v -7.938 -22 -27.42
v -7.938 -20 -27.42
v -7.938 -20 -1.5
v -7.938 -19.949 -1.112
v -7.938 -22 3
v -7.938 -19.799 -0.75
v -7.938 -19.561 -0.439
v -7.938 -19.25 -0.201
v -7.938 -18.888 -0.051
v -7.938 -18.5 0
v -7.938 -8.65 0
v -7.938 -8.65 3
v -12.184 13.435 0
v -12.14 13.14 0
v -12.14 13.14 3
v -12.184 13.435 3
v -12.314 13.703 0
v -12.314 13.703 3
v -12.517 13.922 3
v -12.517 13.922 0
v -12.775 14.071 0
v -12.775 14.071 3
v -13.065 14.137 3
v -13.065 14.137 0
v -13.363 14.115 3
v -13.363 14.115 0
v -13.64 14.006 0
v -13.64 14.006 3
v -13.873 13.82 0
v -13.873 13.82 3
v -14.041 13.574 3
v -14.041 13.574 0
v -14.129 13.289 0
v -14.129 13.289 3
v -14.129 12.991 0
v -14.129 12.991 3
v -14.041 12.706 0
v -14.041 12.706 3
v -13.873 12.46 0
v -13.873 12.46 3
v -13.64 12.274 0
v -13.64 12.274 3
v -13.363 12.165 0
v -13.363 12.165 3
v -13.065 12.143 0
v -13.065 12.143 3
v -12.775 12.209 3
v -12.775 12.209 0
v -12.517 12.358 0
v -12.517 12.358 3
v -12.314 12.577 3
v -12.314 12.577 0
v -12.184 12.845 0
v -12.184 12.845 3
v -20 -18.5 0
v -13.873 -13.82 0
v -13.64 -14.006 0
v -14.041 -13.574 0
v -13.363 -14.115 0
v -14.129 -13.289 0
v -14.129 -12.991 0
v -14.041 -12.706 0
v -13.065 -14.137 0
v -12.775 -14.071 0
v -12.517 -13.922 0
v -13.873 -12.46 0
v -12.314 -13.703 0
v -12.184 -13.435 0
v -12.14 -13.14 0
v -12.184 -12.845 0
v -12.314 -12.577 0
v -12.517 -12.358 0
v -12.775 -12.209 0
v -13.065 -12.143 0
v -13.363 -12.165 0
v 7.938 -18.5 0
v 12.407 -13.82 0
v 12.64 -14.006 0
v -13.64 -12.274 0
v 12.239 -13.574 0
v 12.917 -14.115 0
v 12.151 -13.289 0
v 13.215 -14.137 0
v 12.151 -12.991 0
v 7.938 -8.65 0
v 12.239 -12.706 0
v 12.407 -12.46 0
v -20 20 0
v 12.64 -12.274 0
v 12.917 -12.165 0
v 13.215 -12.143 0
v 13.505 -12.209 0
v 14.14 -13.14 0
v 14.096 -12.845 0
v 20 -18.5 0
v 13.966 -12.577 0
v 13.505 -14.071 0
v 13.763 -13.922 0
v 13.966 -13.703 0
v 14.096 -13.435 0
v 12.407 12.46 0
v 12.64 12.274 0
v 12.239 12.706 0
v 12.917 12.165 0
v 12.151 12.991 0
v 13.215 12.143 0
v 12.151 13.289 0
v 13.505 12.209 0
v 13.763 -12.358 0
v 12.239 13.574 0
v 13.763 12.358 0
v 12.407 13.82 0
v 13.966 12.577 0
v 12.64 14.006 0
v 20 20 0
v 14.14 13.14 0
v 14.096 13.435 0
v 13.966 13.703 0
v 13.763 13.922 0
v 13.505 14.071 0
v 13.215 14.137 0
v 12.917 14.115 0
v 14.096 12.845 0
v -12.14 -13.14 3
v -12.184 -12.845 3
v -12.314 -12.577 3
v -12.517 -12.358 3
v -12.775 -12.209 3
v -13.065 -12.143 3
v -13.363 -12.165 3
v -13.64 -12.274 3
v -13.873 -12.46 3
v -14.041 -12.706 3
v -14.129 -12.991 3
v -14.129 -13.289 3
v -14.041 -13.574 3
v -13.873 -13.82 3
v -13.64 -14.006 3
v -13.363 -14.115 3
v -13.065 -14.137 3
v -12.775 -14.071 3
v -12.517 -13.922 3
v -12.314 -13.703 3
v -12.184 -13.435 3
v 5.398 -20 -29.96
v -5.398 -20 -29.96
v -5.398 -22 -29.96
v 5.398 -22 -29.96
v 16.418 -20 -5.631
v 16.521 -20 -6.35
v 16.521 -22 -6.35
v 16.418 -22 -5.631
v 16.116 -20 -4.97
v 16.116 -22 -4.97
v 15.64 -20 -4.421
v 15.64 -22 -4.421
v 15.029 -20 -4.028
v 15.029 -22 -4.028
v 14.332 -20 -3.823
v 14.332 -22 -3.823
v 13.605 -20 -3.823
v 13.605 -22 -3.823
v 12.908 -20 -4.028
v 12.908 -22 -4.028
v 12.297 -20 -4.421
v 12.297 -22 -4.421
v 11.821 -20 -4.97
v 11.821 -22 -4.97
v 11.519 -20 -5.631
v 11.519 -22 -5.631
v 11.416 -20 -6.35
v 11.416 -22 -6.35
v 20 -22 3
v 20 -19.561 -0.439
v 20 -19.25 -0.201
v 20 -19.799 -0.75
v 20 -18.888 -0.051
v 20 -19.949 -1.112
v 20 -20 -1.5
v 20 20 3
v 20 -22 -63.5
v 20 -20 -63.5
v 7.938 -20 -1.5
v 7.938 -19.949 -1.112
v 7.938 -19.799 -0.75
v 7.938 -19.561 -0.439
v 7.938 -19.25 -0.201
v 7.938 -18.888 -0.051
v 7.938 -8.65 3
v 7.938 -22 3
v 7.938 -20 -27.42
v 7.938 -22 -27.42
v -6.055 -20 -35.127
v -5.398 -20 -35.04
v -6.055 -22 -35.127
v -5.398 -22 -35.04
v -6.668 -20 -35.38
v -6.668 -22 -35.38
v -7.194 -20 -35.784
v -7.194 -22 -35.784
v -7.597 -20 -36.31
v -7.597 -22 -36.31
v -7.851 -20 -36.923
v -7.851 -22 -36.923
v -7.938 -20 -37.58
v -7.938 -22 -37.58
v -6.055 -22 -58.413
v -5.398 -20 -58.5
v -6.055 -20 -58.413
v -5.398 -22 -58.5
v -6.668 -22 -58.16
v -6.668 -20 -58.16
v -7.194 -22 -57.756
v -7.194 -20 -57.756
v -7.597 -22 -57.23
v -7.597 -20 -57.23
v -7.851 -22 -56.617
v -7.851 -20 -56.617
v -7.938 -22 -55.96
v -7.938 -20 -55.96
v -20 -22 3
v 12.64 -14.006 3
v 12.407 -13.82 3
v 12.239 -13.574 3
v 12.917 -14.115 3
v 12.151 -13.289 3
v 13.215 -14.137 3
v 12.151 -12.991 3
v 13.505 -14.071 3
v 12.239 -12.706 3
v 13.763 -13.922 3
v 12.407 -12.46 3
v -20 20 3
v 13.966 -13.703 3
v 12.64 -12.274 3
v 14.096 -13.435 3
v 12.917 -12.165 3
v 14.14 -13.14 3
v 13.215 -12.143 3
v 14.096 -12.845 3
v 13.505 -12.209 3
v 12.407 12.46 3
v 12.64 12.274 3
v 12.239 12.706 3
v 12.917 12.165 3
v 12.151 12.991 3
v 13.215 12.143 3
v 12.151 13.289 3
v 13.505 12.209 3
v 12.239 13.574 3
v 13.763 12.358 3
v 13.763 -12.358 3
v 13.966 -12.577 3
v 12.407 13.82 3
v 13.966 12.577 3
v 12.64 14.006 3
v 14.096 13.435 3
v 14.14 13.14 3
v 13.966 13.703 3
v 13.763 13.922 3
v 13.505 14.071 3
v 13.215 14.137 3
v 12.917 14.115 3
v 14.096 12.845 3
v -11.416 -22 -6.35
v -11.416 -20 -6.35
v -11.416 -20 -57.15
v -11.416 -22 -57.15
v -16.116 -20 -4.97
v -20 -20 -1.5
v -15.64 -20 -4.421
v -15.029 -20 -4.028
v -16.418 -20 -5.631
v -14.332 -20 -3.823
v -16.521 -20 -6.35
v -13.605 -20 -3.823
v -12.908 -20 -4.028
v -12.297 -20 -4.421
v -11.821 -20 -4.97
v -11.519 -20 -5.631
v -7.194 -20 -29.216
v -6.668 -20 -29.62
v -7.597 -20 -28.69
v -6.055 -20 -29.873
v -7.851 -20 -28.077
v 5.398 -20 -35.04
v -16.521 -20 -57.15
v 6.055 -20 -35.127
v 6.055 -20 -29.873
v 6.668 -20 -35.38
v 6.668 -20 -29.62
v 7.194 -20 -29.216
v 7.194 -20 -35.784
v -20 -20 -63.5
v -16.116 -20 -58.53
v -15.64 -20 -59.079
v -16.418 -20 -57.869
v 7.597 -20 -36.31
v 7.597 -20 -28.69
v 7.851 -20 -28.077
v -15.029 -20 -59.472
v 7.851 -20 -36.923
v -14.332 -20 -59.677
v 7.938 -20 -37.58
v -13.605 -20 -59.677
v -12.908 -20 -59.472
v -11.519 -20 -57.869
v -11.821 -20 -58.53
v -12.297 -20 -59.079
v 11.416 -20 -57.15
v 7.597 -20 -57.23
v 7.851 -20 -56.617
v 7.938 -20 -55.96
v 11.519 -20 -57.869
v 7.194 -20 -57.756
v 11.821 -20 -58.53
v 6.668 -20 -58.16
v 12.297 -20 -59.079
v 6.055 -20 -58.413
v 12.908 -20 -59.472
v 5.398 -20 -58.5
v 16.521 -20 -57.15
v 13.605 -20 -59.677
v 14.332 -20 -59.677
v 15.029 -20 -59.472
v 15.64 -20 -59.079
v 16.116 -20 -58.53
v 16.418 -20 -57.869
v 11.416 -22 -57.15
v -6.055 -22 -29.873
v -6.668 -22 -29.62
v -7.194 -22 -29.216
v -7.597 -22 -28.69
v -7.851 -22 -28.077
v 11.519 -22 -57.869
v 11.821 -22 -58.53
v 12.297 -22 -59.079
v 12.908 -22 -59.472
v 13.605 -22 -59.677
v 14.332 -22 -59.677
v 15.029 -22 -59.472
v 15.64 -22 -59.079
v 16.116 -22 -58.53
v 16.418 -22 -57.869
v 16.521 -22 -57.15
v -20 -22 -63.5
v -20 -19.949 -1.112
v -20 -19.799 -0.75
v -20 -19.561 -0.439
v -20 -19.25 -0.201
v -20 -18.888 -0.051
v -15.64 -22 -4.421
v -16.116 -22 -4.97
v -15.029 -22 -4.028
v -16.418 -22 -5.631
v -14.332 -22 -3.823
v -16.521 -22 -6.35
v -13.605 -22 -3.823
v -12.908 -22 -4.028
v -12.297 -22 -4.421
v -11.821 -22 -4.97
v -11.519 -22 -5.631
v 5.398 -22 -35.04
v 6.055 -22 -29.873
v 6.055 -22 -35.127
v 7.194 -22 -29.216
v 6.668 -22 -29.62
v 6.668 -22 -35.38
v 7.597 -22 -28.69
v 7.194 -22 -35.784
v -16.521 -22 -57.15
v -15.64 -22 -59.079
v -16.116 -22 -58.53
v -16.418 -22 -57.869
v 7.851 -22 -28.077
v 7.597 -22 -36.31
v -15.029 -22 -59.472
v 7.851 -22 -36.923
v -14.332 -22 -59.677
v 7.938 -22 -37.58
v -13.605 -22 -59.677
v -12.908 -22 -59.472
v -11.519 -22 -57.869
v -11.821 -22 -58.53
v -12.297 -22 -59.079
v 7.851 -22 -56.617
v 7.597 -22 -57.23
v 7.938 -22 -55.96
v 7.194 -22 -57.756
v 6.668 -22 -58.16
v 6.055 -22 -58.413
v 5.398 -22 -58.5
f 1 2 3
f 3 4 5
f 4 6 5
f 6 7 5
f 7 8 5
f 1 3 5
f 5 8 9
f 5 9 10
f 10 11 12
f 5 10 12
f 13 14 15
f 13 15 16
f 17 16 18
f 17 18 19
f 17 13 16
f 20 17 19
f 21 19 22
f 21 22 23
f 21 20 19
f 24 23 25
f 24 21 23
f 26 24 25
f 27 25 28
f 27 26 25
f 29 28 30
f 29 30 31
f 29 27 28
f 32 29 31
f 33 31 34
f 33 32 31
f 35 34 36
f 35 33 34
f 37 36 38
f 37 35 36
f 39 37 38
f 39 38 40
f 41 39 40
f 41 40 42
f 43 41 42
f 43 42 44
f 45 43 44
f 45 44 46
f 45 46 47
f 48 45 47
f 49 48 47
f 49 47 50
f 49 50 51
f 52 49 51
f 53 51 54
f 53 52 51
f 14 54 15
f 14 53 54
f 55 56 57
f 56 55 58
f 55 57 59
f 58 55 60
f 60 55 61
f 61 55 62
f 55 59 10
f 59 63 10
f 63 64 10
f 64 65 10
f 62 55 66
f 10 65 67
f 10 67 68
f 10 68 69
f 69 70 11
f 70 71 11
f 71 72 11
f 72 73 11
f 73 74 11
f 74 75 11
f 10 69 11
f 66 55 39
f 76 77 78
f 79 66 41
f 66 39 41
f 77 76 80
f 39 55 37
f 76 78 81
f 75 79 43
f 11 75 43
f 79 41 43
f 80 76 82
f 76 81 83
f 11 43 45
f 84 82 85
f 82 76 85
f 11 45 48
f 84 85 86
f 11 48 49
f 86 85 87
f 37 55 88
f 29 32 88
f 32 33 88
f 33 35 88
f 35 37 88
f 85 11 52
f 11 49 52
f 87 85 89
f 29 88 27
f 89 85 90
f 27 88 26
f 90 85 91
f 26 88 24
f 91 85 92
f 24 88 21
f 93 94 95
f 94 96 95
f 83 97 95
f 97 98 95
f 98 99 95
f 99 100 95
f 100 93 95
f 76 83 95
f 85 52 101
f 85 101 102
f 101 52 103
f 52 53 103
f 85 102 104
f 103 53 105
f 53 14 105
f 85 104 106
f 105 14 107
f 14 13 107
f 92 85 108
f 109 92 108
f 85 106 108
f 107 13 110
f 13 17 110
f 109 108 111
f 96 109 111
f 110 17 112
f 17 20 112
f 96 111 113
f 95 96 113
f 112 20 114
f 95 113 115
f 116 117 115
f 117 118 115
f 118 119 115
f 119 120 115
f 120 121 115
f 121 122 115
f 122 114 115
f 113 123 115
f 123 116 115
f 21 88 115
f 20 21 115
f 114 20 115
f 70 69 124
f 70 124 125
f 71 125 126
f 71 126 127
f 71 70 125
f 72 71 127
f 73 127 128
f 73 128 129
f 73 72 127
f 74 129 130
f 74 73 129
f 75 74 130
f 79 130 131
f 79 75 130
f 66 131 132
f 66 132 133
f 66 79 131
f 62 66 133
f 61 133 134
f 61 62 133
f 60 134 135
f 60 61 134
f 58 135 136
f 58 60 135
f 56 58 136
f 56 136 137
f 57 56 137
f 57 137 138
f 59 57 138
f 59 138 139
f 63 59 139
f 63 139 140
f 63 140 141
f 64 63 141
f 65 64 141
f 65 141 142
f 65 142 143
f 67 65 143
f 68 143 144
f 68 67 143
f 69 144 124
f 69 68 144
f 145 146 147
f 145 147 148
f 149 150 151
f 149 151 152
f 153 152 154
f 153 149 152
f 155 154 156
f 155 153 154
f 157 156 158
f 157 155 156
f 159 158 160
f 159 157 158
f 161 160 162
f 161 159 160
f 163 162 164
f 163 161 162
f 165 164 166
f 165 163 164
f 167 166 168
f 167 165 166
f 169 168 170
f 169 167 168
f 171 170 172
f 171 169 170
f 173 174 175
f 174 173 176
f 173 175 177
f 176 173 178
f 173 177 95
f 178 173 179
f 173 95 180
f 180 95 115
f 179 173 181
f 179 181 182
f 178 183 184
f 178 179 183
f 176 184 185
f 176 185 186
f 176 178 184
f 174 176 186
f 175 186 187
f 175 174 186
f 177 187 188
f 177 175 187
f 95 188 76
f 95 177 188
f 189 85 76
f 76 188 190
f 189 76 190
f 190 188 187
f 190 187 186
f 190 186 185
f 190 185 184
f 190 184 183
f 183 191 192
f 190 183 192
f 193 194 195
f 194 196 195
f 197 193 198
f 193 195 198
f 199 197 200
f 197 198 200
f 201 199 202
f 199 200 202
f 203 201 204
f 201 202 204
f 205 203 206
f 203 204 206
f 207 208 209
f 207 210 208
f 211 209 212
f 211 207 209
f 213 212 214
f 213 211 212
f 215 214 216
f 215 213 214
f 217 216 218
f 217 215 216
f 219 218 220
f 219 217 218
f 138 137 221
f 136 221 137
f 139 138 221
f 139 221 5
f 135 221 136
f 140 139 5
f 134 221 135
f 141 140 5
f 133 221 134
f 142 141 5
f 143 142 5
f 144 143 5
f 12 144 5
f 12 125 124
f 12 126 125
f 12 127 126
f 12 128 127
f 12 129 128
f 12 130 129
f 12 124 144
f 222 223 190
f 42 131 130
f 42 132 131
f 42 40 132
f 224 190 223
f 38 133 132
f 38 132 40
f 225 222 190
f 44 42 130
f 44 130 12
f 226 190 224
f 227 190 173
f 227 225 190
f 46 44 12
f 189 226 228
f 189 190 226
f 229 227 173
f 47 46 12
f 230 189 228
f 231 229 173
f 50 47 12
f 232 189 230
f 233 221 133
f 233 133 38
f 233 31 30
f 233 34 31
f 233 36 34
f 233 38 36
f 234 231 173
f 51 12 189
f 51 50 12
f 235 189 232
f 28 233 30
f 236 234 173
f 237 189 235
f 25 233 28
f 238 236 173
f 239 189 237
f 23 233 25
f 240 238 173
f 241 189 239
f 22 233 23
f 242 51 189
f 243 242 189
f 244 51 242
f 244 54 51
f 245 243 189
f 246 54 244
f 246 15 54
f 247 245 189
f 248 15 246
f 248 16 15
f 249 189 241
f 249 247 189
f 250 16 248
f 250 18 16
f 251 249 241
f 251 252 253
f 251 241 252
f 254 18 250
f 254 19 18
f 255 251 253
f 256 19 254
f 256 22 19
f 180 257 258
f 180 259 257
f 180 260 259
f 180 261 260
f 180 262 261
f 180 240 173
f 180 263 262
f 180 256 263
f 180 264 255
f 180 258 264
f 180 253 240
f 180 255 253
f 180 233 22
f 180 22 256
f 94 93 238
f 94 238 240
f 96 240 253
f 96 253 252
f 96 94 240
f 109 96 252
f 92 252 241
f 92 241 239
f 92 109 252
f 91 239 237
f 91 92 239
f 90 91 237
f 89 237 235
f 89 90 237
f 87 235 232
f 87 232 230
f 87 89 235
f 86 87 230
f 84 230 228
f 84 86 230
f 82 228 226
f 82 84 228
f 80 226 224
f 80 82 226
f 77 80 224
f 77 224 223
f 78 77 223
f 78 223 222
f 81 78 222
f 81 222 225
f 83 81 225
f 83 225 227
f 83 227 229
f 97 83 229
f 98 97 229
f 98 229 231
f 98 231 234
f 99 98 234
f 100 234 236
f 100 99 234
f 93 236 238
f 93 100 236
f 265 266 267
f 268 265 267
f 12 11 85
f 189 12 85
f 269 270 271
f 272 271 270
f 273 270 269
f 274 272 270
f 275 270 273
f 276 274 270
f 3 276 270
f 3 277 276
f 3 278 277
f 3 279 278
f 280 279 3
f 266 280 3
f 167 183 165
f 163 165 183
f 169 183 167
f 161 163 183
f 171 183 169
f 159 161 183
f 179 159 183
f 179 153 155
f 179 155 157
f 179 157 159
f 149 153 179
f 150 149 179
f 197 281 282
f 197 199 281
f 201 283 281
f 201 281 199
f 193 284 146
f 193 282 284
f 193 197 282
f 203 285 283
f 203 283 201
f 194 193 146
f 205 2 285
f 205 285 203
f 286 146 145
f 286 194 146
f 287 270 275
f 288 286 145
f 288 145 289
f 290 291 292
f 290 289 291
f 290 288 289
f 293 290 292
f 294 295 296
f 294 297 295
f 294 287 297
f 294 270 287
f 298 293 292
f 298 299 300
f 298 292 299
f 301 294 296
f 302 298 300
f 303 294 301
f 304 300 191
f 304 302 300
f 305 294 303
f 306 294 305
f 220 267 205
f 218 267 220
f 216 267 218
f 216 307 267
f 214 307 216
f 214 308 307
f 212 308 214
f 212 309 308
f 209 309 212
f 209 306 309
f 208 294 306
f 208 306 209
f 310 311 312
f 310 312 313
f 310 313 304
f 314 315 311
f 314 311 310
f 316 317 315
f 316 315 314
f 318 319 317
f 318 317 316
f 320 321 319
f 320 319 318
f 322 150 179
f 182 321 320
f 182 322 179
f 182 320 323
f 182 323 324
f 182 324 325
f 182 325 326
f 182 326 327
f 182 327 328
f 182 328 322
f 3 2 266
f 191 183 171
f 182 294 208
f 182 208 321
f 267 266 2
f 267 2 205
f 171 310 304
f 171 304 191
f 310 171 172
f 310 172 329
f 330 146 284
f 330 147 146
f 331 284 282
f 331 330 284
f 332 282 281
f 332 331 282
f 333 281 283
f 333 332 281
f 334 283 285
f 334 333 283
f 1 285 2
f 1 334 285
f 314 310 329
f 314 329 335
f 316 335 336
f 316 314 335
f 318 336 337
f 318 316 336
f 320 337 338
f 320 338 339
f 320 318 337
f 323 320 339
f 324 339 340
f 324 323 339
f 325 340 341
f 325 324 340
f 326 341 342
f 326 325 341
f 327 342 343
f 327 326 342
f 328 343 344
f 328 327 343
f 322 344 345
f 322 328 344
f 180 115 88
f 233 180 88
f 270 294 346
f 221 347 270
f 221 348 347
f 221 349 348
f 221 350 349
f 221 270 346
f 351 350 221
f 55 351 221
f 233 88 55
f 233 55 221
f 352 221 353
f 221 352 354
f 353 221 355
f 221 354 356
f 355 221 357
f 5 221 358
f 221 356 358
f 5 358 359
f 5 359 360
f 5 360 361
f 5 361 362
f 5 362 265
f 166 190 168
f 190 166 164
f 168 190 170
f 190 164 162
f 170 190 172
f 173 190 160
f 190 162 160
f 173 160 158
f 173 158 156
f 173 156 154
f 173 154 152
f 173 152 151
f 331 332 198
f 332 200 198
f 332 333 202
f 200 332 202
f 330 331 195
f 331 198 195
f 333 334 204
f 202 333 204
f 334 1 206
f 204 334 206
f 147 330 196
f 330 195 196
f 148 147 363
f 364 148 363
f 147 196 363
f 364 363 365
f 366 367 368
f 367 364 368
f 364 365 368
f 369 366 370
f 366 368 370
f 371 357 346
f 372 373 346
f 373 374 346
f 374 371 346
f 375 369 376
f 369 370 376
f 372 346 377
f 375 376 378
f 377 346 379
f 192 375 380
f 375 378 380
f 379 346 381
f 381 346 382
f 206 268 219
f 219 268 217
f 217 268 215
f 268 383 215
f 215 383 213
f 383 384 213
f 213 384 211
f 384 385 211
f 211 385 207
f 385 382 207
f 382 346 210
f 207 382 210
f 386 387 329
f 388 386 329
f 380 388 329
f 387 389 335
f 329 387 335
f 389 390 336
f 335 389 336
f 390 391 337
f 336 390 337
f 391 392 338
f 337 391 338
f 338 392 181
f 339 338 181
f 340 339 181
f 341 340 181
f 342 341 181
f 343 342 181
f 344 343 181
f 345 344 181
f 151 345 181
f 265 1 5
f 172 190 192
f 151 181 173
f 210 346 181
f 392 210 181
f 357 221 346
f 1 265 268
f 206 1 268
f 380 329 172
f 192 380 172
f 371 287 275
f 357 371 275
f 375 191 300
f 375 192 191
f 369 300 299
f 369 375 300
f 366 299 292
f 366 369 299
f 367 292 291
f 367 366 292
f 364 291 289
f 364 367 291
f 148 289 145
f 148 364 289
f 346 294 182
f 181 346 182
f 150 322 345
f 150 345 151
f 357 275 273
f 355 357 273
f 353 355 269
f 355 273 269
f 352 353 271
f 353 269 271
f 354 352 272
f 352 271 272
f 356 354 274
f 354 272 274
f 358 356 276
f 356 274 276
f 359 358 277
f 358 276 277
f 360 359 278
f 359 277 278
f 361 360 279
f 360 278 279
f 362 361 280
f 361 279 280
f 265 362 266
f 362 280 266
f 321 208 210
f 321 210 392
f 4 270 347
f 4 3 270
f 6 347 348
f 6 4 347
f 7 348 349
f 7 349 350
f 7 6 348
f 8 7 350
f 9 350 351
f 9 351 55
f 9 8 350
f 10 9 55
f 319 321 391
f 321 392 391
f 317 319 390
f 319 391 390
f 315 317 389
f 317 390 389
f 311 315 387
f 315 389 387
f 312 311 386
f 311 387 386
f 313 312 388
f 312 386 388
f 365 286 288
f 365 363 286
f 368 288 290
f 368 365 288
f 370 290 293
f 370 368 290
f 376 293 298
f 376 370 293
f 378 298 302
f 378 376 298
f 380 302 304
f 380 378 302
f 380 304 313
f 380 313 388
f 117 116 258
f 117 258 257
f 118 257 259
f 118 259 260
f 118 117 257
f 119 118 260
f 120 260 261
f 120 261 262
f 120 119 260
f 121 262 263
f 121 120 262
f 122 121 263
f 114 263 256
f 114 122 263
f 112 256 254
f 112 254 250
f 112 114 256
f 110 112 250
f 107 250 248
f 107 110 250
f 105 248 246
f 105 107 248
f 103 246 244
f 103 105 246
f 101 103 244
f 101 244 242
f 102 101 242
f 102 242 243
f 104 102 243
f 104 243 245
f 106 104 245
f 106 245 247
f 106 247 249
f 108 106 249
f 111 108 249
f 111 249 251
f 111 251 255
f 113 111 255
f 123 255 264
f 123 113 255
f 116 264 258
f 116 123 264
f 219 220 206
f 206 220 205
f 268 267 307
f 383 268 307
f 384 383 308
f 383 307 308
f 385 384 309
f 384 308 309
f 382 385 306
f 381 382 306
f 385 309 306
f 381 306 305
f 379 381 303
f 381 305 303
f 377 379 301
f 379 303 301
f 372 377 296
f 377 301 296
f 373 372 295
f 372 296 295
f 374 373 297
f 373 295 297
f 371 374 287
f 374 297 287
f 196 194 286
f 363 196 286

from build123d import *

# Parameters (mm, degrees)
SKETCH1_R           = 1
BOSS_EXTRUDE1_DEPTH = 3
SKETCH2_W           = 12.0625
SKETCH2_H           = 66.5
BOSS_EXTRUDE2_DEPTH = 2
FILLET1_R           = 1.5
SKETCH3_W           = 15.875
SKETCH3_H           = 5
SKETCH3_H_2         = 5.08
BOSS_EXTRUDE3_DEPTH = 2
FILLET2_R           = 2.54


with BuildPart() as part:
    # Sketch1 → Boss-Extrude1 (new body)
    with BuildSketch(Plane.XY):
        Polygon((-20, 20), (-20, -20), (-7.9375, -20), (-7.9375, -8.65), (7.9375, -8.65), (7.9375, -20), (20, -20), (20, 20), align=None)
        with Locations((-13.14, -13.14)):
            Circle(SKETCH1_R, mode=Mode.SUBTRACT)
        with Locations((13.14, -13.14)):
            Circle(SKETCH1_R, mode=Mode.SUBTRACT)
        with Locations((-13.14, 13.14)):
            Circle(SKETCH1_R, mode=Mode.SUBTRACT)
        with Locations((13.14, 13.14)):
            Circle(SKETCH1_R, mode=Mode.SUBTRACT)
    extrude(amount=BOSS_EXTRUDE1_DEPTH)

    # Sketch2 → Boss-Extrude2 (add)
    with BuildSketch(Plane.XZ.offset(20)):
        with Locations((-13.96875, -30.25)):
            Rectangle(SKETCH2_W, SKETCH2_H)
        with BuildLine():
            Line((-11.41605, -6.35), (-11.41605, -57.15))
            ThreePointArc((-11.41605, -57.15), (-13.96875, -59.7027), (-16.52145, -57.15))
            Line((-16.52145, -57.15), (-16.52145, -6.35))
            ThreePointArc((-16.52145, -6.35), (-13.96875, -3.7973), (-11.41605, -6.35))
        make_face(mode=Mode.SUBTRACT)
        with Locations((13.96875, -30.25)):
            Rectangle(SKETCH2_W, SKETCH2_H)
        with BuildLine():
            Line((11.41605, -6.35), (11.41605, -57.15))
            ThreePointArc((11.41605, -57.15), (13.96875, -59.7027), (16.52145, -57.15))
            Line((16.52145, -57.15), (16.52145, -6.35))
            ThreePointArc((16.52145, -6.35), (13.96875, -3.7973), (11.41605, -6.35))
        make_face(mode=Mode.SUBTRACT)
    extrude(amount=BOSS_EXTRUDE2_DEPTH)

    # Fillet1
    fillet1_edges = [part.edges().sort_by_distance(p)[0] for p in [
        (13.96875, -20, 0),
        (-13.96875, -20, 0),
    ]]
    fillet(fillet1_edges, radius=FILLET1_R)

    # Sketch3 → Boss-Extrude3 (add)
    with BuildSketch(Plane(origin=(0, -20, 0), x_dir=(1, 0, 0), z_dir=(0, 1, 0))):
        with Locations((0, 61)):
            Rectangle(SKETCH3_W, SKETCH3_H)
        with Locations((0, 32.5)):
            Rectangle(SKETCH3_W, SKETCH3_H_2)
    extrude(amount=-BOSS_EXTRUDE3_DEPTH)

    # Fillet2
    fillet2_edges = [part.edges().sort_by_distance(p)[0] for p in [
        (7.9375, -21, -58.5),
        (-7.9375, -21, -58.5),
        (7.9375, -21, -29.96),
        (7.9375, -21, -35.04),
        (-7.9375, -21, -35.04),
        (-7.9375, -21, -29.96),
    ]]
    fillet(fillet2_edges, radius=FILLET2_R)


solid = part.part
